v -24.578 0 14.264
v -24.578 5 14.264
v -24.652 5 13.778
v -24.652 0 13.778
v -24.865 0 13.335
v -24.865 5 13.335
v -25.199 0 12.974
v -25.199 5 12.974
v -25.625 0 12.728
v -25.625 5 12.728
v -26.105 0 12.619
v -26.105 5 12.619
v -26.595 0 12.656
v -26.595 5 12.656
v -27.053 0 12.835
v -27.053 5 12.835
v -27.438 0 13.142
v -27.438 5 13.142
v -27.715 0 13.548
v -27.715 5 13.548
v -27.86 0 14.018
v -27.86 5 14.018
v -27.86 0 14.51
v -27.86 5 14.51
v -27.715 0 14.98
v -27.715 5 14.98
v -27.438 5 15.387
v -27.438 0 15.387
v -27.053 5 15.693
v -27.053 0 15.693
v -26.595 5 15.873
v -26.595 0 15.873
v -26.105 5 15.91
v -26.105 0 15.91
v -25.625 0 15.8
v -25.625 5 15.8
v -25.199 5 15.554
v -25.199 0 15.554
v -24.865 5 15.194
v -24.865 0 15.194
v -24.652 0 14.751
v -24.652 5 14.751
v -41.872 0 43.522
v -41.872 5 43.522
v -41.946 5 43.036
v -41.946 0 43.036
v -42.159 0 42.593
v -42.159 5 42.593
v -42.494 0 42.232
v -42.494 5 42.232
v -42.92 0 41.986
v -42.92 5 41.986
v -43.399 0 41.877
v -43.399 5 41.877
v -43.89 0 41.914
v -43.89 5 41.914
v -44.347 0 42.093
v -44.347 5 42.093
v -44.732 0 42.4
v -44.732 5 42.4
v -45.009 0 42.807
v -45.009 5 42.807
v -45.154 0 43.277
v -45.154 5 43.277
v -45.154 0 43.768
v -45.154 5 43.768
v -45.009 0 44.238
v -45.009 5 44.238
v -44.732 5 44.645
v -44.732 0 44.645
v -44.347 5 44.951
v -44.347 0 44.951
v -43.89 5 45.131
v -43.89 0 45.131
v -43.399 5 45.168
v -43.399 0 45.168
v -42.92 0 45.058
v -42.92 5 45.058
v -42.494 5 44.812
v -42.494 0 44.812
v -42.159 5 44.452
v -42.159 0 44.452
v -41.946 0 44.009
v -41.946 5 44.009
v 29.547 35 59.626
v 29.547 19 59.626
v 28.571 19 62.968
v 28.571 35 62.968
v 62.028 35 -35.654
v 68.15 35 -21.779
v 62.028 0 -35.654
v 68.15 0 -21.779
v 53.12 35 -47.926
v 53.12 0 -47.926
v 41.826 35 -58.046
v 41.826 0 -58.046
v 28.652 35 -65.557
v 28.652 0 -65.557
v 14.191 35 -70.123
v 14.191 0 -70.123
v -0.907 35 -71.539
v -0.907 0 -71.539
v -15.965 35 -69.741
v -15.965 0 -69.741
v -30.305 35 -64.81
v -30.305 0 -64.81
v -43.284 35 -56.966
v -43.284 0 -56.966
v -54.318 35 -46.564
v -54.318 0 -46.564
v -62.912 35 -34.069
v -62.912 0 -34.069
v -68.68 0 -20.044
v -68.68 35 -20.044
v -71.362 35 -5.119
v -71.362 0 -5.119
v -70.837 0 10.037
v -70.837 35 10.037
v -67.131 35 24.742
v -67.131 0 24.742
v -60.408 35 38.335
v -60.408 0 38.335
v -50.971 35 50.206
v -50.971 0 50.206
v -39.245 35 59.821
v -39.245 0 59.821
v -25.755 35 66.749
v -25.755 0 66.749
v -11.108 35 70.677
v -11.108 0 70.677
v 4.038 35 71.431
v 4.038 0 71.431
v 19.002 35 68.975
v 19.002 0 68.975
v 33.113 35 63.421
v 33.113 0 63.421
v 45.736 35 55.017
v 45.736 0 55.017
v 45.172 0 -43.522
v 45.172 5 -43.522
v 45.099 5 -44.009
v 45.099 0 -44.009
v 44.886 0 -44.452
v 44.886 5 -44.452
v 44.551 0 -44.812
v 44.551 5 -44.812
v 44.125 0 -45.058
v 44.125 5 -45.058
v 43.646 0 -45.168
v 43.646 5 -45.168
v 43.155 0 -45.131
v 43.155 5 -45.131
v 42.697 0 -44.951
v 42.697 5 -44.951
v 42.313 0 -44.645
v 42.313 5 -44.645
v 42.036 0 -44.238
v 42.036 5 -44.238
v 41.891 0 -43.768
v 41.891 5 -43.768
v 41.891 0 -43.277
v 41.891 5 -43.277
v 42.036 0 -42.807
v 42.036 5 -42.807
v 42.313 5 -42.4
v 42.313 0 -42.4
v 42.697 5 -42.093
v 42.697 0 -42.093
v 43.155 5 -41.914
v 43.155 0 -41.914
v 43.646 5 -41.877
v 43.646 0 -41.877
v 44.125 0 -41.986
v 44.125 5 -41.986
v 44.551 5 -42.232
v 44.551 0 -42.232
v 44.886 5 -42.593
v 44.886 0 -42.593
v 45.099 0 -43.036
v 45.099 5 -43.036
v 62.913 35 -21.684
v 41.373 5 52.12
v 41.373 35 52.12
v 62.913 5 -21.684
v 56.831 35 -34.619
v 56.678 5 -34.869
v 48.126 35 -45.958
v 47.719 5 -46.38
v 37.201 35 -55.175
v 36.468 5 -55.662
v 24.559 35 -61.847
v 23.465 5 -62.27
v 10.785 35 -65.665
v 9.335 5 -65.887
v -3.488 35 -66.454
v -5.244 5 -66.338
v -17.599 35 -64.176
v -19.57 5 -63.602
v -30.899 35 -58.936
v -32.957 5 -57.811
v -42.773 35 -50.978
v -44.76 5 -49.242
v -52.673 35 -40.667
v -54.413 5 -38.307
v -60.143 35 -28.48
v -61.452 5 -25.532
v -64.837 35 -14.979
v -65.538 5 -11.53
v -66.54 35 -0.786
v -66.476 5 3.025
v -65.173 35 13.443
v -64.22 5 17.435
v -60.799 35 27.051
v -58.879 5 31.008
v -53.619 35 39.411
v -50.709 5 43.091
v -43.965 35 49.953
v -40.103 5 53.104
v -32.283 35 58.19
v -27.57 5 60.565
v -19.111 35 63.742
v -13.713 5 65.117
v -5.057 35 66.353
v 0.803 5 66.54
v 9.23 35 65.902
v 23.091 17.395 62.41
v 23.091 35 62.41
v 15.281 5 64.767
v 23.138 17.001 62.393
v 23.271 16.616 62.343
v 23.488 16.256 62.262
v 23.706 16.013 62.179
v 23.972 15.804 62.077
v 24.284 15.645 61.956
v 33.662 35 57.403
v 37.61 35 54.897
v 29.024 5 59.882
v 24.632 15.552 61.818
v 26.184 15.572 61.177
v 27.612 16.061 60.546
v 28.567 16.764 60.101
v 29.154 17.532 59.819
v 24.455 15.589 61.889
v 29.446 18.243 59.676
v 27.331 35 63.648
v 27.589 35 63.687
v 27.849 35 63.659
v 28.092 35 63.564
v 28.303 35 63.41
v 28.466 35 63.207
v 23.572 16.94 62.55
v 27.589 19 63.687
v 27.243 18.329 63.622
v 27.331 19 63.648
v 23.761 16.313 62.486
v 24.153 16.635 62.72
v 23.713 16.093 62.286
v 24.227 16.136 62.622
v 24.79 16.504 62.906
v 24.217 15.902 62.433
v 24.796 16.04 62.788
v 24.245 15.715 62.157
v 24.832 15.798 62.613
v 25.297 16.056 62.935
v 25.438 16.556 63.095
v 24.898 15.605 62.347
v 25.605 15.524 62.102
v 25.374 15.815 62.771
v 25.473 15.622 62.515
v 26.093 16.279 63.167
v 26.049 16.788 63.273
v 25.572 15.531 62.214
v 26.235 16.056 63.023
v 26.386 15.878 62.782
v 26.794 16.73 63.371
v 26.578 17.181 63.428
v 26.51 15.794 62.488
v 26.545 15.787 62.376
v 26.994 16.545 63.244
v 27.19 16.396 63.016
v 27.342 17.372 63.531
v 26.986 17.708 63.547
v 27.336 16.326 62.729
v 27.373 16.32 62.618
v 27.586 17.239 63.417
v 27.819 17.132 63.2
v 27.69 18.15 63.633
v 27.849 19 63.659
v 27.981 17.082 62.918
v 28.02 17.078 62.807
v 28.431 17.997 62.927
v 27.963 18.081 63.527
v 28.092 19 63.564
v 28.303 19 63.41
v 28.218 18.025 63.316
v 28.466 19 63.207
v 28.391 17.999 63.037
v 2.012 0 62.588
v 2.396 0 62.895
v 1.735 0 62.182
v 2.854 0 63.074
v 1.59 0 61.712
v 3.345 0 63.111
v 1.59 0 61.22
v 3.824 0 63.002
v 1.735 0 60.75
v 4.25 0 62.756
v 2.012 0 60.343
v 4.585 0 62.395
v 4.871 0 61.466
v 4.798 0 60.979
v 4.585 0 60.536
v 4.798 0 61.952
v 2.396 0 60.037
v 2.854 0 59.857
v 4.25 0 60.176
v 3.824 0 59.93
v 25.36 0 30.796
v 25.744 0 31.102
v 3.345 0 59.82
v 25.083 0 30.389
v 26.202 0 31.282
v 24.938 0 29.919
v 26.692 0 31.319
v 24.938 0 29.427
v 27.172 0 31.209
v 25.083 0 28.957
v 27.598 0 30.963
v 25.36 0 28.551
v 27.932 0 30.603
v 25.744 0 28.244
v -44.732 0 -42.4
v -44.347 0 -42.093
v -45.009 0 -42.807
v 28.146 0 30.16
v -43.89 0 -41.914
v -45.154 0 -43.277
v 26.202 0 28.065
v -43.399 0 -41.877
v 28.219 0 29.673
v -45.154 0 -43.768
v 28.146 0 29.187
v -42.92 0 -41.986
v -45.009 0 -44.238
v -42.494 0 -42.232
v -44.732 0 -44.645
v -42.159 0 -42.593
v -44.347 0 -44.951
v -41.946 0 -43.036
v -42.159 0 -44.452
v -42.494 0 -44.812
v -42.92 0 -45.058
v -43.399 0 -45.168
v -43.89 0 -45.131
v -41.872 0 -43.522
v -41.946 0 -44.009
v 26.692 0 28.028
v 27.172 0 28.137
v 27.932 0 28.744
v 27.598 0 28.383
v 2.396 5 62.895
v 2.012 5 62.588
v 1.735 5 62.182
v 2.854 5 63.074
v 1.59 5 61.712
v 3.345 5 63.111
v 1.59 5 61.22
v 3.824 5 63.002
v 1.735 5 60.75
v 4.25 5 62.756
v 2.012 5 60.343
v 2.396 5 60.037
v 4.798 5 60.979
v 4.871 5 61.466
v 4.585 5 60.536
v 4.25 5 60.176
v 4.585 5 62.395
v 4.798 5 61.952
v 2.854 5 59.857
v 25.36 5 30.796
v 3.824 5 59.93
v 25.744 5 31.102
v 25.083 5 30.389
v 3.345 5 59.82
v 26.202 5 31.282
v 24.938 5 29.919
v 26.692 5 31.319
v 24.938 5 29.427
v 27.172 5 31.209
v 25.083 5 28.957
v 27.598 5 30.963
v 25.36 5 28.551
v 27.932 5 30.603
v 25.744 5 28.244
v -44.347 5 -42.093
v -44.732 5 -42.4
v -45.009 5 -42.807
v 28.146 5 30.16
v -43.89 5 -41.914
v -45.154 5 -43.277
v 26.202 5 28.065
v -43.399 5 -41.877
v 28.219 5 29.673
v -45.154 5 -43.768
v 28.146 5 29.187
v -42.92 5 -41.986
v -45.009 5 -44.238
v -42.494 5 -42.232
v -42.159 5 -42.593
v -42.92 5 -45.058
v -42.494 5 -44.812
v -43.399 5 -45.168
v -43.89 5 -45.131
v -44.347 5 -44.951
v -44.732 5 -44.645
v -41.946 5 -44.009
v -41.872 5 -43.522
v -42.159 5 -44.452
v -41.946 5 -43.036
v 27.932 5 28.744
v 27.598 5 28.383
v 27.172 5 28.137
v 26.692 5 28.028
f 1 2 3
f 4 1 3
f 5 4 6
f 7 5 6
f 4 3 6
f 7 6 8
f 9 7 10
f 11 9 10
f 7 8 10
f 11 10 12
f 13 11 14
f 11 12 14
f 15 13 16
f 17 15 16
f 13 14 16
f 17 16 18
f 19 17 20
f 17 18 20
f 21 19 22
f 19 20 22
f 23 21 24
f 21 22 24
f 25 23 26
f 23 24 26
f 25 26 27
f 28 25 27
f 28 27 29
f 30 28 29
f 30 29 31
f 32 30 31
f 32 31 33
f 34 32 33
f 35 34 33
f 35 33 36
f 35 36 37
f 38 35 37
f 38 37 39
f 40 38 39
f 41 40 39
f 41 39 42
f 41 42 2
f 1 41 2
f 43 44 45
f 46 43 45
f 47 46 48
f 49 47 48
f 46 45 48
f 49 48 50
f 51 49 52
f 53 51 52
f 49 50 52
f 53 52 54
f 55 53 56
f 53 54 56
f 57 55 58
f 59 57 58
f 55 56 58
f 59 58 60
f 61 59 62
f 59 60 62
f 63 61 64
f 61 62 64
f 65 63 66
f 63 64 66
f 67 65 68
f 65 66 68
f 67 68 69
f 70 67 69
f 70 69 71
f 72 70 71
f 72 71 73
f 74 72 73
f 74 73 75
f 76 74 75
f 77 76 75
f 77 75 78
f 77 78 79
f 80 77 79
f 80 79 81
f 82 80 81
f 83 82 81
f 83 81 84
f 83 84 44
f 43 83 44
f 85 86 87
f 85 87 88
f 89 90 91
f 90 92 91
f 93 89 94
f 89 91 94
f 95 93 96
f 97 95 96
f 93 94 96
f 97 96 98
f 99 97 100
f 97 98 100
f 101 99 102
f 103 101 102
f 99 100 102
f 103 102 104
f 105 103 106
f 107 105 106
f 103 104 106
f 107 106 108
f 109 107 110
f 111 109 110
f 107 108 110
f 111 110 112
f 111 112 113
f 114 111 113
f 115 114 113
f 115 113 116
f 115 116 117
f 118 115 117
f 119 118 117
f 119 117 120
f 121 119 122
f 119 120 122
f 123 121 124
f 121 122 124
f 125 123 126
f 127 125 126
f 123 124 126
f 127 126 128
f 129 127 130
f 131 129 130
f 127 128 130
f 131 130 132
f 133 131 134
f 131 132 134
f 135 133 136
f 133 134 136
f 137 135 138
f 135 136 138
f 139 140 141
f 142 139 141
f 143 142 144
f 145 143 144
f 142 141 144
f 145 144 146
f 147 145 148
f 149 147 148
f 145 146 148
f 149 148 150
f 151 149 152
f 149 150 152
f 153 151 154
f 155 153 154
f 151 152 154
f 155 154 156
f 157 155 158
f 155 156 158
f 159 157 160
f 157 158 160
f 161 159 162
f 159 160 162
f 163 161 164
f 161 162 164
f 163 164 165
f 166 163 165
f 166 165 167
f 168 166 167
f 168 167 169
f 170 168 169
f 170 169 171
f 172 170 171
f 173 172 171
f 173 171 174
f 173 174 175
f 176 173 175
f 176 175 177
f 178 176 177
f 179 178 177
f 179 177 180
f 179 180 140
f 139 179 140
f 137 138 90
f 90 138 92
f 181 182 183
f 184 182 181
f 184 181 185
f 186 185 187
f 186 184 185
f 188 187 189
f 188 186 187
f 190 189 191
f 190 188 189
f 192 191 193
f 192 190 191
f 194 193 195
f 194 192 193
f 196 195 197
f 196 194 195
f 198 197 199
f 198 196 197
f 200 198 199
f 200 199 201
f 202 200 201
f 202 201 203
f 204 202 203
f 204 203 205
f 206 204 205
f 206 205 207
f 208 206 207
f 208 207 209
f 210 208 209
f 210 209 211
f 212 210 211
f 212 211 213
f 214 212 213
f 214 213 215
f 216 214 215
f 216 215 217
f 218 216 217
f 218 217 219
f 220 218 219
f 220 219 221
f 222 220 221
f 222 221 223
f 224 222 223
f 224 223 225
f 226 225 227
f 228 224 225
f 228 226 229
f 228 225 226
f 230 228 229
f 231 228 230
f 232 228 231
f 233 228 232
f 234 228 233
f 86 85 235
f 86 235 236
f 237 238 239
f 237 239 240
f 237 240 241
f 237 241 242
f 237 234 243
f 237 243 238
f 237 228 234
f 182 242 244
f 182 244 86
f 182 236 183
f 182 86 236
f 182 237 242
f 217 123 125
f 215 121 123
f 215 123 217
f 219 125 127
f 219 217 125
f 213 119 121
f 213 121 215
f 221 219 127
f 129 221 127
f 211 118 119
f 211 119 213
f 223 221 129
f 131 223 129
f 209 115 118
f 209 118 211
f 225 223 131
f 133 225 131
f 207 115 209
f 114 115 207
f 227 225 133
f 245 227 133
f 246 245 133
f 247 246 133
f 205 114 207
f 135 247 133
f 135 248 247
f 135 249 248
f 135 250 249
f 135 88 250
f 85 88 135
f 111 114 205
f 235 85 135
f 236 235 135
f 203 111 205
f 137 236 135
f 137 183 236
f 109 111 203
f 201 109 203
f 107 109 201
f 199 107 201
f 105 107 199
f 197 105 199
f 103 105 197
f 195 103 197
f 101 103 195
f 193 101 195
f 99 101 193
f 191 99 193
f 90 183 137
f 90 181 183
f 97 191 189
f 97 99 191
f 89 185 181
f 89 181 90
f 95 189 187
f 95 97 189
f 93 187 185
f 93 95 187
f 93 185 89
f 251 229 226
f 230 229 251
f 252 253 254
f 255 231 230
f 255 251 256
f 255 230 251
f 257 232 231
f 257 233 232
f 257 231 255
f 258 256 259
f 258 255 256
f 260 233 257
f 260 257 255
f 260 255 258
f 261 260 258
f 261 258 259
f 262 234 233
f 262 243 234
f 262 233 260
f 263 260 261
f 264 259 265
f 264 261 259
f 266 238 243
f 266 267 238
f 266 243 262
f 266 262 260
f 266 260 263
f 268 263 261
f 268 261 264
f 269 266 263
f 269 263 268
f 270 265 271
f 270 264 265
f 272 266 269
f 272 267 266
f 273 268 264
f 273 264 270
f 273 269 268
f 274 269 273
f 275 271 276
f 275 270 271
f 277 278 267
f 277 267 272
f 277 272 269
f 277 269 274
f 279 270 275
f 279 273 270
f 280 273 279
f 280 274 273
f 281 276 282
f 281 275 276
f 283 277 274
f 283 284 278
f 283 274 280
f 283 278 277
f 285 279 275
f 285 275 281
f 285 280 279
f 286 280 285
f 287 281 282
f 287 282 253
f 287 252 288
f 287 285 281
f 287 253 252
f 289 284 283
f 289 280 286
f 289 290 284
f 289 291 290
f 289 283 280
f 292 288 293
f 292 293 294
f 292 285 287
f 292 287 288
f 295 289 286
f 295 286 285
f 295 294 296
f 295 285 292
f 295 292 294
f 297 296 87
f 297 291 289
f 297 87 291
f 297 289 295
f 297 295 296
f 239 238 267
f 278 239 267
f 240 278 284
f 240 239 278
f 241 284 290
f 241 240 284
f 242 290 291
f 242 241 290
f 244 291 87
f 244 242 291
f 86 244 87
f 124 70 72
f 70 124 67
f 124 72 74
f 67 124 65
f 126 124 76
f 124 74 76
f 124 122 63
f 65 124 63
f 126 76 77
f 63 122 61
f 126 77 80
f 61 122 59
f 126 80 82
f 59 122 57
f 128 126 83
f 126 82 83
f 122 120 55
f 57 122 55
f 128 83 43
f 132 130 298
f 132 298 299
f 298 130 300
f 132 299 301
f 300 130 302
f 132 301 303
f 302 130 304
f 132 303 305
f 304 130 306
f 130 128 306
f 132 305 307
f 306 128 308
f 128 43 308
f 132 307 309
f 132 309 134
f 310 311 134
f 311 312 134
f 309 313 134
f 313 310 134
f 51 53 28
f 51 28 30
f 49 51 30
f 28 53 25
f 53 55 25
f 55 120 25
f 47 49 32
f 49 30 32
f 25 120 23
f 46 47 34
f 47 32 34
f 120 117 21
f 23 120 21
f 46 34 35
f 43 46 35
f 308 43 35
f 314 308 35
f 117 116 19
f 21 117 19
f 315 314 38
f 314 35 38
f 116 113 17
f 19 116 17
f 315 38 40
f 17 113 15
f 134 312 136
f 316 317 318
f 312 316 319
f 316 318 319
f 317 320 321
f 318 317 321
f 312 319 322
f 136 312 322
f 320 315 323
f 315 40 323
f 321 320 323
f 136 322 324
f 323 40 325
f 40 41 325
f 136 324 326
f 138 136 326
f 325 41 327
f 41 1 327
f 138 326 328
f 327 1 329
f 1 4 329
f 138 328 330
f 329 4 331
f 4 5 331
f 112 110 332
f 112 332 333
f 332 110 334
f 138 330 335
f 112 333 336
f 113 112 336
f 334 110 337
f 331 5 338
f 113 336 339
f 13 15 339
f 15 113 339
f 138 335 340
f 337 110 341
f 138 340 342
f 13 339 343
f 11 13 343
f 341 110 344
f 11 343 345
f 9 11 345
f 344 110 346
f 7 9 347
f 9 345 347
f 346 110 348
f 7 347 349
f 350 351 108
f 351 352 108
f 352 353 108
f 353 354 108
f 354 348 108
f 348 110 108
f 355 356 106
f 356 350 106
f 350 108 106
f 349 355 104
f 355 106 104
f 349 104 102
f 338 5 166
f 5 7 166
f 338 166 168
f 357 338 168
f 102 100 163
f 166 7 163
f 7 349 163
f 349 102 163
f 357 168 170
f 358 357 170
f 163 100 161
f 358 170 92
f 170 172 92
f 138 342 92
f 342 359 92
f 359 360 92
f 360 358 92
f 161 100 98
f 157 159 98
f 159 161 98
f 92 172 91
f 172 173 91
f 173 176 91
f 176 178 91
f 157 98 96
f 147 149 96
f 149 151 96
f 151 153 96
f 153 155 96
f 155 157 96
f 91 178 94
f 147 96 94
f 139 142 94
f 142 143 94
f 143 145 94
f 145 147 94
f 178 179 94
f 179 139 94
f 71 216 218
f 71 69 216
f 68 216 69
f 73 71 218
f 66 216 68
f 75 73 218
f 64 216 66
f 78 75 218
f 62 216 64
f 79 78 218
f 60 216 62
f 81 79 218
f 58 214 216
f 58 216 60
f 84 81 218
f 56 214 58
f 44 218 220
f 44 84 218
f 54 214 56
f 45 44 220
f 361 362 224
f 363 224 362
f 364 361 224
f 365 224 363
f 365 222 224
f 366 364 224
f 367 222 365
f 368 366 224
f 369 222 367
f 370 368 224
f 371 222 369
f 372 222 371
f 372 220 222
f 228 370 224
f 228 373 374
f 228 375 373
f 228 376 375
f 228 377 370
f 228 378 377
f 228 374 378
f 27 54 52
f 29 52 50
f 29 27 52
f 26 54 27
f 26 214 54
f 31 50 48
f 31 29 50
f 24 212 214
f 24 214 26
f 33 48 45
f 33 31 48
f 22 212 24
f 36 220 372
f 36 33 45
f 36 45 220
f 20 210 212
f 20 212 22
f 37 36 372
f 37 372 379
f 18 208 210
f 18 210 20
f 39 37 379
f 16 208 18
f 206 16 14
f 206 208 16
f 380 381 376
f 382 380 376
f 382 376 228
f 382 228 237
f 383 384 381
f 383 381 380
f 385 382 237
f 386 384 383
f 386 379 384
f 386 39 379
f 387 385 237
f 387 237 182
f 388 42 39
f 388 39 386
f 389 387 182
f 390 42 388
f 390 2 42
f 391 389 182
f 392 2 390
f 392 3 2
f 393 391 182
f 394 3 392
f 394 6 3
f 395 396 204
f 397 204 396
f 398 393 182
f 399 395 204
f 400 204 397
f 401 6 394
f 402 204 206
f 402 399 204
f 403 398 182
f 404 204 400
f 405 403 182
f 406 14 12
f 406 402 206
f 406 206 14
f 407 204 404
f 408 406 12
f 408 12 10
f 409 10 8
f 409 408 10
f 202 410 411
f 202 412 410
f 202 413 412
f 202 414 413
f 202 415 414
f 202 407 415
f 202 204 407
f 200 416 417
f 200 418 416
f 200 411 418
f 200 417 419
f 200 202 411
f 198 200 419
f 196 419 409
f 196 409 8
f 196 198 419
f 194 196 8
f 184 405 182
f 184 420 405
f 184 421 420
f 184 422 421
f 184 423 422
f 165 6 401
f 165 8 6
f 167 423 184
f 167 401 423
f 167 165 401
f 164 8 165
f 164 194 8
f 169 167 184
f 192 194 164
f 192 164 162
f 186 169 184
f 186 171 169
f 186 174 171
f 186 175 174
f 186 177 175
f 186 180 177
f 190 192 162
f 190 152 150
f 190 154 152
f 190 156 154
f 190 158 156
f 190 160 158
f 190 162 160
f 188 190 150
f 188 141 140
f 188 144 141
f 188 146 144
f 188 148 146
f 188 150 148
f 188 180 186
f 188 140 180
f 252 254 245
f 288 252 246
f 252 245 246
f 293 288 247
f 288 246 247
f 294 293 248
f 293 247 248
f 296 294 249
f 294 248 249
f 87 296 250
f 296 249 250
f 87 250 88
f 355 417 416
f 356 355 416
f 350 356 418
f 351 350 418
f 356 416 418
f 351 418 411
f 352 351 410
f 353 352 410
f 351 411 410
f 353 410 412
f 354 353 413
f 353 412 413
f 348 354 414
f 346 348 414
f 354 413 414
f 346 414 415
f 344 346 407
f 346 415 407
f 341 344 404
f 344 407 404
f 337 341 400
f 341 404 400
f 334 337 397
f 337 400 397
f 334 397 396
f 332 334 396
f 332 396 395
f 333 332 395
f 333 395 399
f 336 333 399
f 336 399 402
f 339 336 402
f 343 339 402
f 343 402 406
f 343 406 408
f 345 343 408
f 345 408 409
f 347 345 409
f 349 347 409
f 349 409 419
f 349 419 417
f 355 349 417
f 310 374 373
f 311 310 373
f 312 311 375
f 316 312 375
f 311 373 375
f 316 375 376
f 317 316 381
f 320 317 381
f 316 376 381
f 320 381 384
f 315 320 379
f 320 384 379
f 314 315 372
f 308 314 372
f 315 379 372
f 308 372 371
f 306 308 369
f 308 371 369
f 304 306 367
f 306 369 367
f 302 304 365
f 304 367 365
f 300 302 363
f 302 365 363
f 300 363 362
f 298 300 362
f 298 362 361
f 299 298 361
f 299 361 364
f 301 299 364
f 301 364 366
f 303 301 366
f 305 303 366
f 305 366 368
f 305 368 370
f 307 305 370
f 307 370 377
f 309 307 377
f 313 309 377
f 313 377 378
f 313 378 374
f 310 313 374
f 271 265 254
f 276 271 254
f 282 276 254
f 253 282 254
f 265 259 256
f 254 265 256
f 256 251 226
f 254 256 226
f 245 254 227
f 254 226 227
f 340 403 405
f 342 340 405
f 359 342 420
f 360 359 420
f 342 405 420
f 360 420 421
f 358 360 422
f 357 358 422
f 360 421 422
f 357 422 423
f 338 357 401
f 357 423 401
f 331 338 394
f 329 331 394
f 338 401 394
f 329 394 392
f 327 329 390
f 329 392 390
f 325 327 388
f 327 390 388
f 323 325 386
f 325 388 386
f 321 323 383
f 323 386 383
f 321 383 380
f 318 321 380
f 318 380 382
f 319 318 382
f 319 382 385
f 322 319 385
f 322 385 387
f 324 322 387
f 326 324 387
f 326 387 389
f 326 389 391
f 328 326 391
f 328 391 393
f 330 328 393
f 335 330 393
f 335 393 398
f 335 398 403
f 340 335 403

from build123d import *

# Parameters (mm, degrees)
BOSS_EXTRUDE1_DEPTH = 5
SKETCH2_R           = 1.65
CUT_EXTRUDE1_DEPTH  = 6
BOSS_EXTRUDE3_DEPTH = 30
CUT_EXTRUDE2_DEPTH  = 15
FILLET1_R           = 1
SKETCH5_R           = 1.65
CUT_EXTRUDE3_DEPTH  = 6


with BuildPart() as part:
    # Sketch1 → Boss-Extrude1 (new body)
    with BuildSketch(Plane(origin=(0, 0, 0), x_dir=(1, 0, 0), z_dir=(0, 1, 0))):
        with BuildLine():
            Line((45.736375855, -55.017005995), (68.149505263, 21.779163377))
            ThreePointArc((68.149505263, 21.779163377), (-68.679774221, 20.044341793), (45.736375855, -55.017005995))
        make_face()
    extrude(amount=BOSS_EXTRUDE1_DEPTH)

    # Sketch2 → Cut-Extrude1 (cut, through all)
    with BuildSketch(Plane(origin=(0, 5, 0), x_dir=(1, 0, 0), z_dir=(0, 1, 0))):
        with Locations((43.522422382, 43.522422382)):
            Circle(SKETCH2_R)
        with Locations((-43.522422382, -43.522422382)):
            Circle(SKETCH2_R)
        with Locations((-43.522422382, 43.522422382)):
            Circle(SKETCH2_R)
        with Locations((3.221278107, -61.465647864)):
            Circle(SKETCH2_R)
    extrude(amount=-CUT_EXTRUDE1_DEPTH, mode=Mode.SUBTRACT)

    # Sketch3 → Boss-Extrude3 (add)
    with BuildSketch(Plane(origin=(0, 5, 0), x_dir=(1, 0, 0), z_dir=(0, 1, 0))):
        with BuildLine():
            Line((45.736375855, -55.017005995), (68.149505263, 21.779163377))
            ThreePointArc((68.149505263, 21.779163377), (-68.679774221, 20.044341793), (45.736375855, -55.017005995))
        make_face()
        with BuildLine():
            Line((41.373300987, -52.119928918), (62.91305896, 21.683727477))
            ThreePointArc((62.91305896, 21.683727477), (-63.880013635, 18.643521205), (41.373300987, -52.119928918))
        make_face(mode=Mode.SUBTRACT)
    extrude(amount=BOSS_EXTRUDE3_DEPTH)

    # Sketch4 → Cut-Extrude2 (cut)
    with BuildSketch(Plane(origin=(-10.769878987, 0, 36.901828197), x_dir=(0, -1, 0), z_dir=(0.280164118, 0, -0.959952117))):
        with BuildLine():
            Line((-19, -45.06852177), (-35, -45.06852177))
            ThreePointArc((-35, -45.06852177), (-38.5, -41.56852177), (-35, -38.06852177))
            Line((-35, -38.06852177), (-19, -38.06852177))
            ThreePointArc((-19, -38.06852177), (-15.5, -41.56852177), (-19, -45.06852177))
        make_face()
    extrude(amount=-CUT_EXTRUDE2_DEPTH, mode=Mode.SUBTRACT)

    # Fillet1
    fillet1_edges = [part.edges().sort_by_distance(p)[0] for p in [
        (26.529321315, 15.921147738, 63.413460481),
        (28.291282139, 27, 63.927692588),
    ]]
    fillet(fillet1_edges, radius=FILLET1_R)

    # Sketch5 → Cut-Extrude3 (cut, through all)
    with BuildSketch(Plane(origin=(0, 5, 0), x_dir=(1, 0, 0), z_dir=(0, 1, 0))):
        with Locations((26.569138232, -29.673397669)):
            Circle(SKETCH5_R)
        with Locations((-26.228228211, -14.264371202)):
            Circle(SKETCH5_R)
    extrude(amount=-CUT_EXTRUDE3_DEPTH, mode=Mode.SUBTRACT)


solid = part.part
